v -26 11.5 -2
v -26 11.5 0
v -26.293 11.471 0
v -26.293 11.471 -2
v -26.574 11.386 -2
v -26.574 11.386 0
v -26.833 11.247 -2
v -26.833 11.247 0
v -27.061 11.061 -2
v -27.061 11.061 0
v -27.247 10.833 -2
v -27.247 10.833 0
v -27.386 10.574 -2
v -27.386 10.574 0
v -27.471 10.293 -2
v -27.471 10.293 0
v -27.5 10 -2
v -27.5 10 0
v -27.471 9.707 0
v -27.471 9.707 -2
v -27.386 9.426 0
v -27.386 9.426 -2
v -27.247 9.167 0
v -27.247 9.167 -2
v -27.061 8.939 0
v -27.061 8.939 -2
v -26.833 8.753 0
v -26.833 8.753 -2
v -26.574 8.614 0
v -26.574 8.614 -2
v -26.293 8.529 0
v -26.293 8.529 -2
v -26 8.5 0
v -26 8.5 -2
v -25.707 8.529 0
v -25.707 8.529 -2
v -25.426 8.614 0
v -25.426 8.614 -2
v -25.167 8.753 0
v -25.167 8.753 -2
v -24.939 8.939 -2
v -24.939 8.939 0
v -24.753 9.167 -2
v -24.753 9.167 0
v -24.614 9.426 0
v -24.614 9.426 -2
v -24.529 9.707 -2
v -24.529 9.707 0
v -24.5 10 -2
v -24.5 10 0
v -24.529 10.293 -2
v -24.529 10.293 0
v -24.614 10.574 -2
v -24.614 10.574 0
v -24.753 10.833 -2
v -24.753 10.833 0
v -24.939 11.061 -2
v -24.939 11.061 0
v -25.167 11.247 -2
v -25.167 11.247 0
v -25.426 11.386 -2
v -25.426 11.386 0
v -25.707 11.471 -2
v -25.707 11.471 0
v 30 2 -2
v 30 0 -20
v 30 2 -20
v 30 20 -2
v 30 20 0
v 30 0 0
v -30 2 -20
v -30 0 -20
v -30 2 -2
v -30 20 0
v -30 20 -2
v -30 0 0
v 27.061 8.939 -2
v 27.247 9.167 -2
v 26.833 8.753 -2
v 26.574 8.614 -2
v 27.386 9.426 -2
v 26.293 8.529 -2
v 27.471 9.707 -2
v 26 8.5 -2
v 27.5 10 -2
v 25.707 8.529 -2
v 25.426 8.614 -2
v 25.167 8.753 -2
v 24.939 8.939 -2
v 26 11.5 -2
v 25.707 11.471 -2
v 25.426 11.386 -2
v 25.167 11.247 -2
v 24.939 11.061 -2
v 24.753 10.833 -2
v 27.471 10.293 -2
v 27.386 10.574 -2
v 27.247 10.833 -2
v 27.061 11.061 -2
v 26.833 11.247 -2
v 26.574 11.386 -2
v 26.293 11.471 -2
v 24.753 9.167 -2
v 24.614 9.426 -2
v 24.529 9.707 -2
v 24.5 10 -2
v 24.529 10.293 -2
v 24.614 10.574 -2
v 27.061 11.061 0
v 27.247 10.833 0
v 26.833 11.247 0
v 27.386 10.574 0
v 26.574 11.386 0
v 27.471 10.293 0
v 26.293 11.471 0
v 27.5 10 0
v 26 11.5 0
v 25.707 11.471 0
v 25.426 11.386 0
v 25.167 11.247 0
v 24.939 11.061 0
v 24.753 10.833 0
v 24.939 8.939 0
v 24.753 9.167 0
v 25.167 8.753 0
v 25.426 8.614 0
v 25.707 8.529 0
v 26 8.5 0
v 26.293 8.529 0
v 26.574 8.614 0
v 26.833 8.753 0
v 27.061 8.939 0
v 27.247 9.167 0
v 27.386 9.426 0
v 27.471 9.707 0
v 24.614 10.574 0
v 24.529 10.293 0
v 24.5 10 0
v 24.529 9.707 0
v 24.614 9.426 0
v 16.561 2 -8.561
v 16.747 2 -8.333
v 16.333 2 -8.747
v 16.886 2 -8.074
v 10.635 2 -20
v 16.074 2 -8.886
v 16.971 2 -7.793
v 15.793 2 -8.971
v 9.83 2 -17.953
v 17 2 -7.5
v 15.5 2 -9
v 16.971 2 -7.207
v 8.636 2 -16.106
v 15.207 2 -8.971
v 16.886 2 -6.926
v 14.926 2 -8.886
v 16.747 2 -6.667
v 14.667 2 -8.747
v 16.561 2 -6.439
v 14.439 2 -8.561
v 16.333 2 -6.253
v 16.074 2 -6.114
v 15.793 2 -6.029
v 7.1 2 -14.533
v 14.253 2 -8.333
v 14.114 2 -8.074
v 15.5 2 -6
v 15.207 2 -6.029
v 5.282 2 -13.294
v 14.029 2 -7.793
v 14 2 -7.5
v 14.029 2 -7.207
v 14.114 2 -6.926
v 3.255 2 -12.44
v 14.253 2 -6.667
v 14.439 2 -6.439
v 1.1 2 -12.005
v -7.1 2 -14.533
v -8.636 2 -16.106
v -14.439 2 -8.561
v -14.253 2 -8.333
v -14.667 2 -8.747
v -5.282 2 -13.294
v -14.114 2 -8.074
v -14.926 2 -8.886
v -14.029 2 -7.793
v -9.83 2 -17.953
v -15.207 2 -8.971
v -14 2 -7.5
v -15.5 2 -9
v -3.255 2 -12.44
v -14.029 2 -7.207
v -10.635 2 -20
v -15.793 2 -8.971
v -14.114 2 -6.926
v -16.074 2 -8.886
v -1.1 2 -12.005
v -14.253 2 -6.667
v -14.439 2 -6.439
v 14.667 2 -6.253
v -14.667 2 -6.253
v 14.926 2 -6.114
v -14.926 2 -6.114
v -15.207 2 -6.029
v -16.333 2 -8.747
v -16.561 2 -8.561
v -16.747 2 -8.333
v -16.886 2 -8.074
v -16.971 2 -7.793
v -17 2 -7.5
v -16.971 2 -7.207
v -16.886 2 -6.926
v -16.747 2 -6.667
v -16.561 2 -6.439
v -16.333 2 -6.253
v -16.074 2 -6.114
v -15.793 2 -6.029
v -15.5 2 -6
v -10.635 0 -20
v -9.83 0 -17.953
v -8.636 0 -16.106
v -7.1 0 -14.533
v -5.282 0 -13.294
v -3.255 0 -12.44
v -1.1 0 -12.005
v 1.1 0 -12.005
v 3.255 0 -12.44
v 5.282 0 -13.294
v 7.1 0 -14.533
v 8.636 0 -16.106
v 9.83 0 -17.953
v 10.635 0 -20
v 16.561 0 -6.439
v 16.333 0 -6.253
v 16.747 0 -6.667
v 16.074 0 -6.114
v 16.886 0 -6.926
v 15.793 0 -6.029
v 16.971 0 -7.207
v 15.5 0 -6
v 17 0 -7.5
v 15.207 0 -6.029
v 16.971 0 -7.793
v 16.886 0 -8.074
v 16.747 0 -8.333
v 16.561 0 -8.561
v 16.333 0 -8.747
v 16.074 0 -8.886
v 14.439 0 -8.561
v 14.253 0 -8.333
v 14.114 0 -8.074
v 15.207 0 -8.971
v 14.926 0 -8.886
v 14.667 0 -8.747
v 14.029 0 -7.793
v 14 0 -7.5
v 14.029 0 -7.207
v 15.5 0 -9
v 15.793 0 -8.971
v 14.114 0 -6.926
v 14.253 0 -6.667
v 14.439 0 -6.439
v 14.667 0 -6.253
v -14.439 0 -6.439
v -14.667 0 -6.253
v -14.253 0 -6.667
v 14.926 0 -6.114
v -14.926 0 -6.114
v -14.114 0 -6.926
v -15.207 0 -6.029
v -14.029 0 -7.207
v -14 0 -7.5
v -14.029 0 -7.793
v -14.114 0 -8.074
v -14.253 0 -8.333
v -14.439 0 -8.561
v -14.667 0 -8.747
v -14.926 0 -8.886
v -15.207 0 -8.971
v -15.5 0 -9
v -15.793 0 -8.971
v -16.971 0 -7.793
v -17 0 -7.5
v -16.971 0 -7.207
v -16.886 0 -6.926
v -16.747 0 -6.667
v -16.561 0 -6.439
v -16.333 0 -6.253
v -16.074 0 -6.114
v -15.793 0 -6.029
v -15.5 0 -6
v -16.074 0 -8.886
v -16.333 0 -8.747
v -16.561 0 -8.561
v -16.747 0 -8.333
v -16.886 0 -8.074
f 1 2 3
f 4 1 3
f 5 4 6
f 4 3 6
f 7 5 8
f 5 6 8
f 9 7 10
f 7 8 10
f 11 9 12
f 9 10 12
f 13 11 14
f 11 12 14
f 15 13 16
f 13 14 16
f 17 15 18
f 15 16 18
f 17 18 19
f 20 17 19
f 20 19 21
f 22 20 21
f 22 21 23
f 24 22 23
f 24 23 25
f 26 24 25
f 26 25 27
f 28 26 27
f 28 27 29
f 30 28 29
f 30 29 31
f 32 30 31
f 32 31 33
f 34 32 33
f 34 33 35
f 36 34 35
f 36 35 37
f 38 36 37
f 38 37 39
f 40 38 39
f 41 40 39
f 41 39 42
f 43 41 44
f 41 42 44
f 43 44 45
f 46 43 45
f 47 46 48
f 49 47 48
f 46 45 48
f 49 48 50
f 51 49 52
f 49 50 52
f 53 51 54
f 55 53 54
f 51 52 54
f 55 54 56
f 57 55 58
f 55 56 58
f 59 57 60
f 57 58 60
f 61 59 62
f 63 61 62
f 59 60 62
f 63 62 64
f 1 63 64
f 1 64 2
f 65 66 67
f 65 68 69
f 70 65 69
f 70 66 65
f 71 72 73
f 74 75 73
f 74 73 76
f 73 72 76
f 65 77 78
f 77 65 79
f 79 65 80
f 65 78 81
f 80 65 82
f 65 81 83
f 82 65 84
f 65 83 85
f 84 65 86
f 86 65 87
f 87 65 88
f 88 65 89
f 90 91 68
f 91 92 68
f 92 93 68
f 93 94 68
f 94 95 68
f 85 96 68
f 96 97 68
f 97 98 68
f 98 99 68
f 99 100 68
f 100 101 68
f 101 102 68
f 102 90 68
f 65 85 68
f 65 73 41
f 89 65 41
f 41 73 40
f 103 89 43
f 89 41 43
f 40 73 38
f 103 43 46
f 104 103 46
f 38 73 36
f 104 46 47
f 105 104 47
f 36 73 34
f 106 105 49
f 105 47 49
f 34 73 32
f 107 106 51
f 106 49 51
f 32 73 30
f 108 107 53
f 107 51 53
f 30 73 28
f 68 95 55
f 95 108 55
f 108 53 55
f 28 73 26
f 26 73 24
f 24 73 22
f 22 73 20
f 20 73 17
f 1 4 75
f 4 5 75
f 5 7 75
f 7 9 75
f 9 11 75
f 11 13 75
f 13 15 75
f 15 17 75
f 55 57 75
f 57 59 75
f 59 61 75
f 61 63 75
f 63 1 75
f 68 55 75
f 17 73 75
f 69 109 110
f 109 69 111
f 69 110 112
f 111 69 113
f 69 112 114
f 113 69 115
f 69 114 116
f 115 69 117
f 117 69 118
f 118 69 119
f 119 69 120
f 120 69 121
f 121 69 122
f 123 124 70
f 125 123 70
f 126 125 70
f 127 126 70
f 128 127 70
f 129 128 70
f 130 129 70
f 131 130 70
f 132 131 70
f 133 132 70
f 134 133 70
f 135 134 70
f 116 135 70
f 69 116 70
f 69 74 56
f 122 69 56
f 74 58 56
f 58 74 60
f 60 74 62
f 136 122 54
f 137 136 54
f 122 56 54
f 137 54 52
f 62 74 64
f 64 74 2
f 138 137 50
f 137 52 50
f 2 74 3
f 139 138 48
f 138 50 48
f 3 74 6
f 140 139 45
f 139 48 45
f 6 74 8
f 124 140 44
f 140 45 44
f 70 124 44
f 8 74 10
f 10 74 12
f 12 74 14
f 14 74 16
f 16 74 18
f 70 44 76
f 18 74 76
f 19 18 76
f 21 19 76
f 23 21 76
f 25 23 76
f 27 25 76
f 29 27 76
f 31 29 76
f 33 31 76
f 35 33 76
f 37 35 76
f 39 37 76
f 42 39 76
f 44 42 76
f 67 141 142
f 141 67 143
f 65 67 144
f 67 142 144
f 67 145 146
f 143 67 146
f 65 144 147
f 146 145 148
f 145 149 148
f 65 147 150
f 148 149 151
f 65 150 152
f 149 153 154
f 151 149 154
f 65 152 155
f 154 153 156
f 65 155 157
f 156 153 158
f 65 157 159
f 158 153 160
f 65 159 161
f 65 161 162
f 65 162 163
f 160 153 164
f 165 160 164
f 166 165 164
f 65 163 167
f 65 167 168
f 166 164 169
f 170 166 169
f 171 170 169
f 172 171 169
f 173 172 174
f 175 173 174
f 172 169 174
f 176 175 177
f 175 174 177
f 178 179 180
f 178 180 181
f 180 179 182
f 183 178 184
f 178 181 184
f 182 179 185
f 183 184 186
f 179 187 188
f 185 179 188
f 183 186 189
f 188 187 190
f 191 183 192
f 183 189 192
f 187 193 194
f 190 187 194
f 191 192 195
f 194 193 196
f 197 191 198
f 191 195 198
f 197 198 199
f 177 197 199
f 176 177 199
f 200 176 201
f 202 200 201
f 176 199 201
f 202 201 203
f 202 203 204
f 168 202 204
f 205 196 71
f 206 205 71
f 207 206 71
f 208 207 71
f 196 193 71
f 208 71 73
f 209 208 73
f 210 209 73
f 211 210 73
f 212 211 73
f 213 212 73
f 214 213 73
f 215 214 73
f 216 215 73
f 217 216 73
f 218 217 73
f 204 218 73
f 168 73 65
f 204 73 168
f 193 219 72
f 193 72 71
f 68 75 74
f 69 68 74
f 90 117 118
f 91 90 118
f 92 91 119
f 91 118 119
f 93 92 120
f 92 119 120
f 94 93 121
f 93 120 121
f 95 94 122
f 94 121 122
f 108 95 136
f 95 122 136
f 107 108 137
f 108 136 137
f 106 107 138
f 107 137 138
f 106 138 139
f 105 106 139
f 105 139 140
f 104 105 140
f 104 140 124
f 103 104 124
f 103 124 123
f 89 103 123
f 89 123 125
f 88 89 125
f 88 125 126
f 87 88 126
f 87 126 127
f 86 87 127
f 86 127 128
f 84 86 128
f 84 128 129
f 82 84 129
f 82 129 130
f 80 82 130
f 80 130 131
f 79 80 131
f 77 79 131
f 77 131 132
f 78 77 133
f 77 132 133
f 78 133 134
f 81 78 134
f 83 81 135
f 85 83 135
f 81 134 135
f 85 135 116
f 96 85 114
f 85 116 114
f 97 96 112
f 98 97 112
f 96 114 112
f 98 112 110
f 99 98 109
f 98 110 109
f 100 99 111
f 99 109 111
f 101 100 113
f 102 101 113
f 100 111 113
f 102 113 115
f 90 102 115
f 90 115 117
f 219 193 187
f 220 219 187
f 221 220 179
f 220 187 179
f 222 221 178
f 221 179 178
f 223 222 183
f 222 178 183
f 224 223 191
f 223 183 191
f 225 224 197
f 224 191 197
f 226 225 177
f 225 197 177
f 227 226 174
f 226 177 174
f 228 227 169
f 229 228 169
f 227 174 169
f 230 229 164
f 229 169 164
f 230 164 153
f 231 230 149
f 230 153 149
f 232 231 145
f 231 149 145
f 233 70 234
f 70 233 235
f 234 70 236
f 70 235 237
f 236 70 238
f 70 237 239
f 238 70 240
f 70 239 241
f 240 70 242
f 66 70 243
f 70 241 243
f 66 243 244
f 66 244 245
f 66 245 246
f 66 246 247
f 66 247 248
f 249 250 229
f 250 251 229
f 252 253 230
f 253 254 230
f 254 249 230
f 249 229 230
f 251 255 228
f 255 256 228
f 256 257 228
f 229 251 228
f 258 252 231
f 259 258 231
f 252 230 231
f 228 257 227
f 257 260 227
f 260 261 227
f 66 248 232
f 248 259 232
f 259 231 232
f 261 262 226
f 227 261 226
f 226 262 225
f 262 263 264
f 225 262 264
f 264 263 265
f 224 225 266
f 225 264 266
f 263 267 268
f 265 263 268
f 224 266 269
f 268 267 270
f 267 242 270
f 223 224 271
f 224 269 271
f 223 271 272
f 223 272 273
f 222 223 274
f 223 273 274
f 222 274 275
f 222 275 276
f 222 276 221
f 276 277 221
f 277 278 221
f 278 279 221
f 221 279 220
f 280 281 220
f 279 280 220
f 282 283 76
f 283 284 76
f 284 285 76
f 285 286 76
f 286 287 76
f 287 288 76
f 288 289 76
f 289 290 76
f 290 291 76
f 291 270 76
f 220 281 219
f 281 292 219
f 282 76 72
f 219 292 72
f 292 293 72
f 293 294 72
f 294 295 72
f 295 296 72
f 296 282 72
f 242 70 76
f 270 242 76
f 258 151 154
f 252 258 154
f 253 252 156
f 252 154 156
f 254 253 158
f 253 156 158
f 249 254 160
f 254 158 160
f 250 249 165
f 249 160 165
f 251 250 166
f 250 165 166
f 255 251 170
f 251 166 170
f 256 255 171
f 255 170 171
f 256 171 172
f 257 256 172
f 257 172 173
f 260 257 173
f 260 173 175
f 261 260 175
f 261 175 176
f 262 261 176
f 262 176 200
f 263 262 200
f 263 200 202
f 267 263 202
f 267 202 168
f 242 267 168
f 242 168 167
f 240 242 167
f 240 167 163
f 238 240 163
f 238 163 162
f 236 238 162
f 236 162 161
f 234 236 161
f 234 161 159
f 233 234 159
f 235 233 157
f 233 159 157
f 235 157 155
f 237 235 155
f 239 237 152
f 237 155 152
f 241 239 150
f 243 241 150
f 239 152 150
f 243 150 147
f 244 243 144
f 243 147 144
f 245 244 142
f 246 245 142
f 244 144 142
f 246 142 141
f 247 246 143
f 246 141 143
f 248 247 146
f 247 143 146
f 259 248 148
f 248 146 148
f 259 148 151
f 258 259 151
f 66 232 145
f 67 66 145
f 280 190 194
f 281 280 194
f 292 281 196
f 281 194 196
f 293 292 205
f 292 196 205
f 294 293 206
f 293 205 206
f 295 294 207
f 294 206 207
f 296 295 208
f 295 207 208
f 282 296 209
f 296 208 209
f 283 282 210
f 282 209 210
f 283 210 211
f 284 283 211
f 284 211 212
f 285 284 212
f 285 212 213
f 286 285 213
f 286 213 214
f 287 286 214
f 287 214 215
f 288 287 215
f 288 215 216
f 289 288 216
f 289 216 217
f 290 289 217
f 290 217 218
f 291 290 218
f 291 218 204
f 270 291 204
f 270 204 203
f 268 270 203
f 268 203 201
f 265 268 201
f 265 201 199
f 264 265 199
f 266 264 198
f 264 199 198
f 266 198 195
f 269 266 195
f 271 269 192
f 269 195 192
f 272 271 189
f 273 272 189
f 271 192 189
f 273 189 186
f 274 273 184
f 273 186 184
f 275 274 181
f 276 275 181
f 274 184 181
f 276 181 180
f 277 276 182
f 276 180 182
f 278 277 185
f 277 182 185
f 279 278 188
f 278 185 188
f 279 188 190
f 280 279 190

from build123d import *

# Parameters (mm, degrees)
PAD_DEPTH                = 30
PAD_DEPTH_BACK           = 30
SKETCH001_R              = 11.05
SKETCH001_R_2            = 1.5
POCKET_DEPTH             = 5.54
SKETCH002_R              = 1.5
POCKET001_DEPTH          = 20.001
CLONE001_PITCH_ANGLE     = 90
CLONE001_PLACEMENT_ANGLE = -90


with BuildPart() as part:
    # Sketch → Pad (new body, two sides)
    with BuildSketch(Plane.XZ) as pad_sk:
        Polygon((-10, -20), (-10, 0), (10, 0), (10, -2), (-8, -2), (-8, -20), align=None)
    extrude(amount=PAD_DEPTH)
    extrude(pad_sk.sketch, amount=-PAD_DEPTH_BACK)

    # Sketch001 (on Face4 of Pad) → Pocket (cut)
    with BuildSketch(Plane(origin=(13, 0, -2), x_dir=(1, 0, 0), z_dir=(0, 0, -1))):
        Circle(SKETCH001_R)
        with Locations((-15.5, 15.5)):
            Circle(SKETCH001_R_2)
        with Locations((15.5, 15.5)):
            Circle(SKETCH001_R_2)
        with Locations((15.5, -15.5)):
            Circle(SKETCH001_R_2)
        with Locations((-15.5, -15.5)):
            Circle(SKETCH001_R_2)
    extrude(amount=-POCKET_DEPTH, mode=Mode.SUBTRACT)

    # Sketch002 (on Face1 of Pocket) → Pocket001 (cut, through all)
    with BuildSketch(Plane(origin=(-10, 0, 0), x_dir=(0, 0, -1), z_dir=(-1, 0, 0))):
        with Locations((10, 26)):
            Circle(SKETCH002_R)
        with Locations((10, -26)):
            Circle(SKETCH002_R)
    extrude(amount=-POCKET001_DEPTH, mode=Mode.SUBTRACT)


with BuildPart() as part_1:
    # Clone001 pitch: moved
    add(part.part.rotate(Axis((0, 0, 0), (0, 1, 0)), CLONE001_PITCH_ANGLE))


with BuildPart() as part_2:
    # Clone001 placement: moved
    add(part_1.part.moved(Location((0, 0, -10))).rotate(Axis((0, 0, -10), (0, 0, 1)), CLONE001_PLACEMENT_ANGLE))


solid = part_2.part
